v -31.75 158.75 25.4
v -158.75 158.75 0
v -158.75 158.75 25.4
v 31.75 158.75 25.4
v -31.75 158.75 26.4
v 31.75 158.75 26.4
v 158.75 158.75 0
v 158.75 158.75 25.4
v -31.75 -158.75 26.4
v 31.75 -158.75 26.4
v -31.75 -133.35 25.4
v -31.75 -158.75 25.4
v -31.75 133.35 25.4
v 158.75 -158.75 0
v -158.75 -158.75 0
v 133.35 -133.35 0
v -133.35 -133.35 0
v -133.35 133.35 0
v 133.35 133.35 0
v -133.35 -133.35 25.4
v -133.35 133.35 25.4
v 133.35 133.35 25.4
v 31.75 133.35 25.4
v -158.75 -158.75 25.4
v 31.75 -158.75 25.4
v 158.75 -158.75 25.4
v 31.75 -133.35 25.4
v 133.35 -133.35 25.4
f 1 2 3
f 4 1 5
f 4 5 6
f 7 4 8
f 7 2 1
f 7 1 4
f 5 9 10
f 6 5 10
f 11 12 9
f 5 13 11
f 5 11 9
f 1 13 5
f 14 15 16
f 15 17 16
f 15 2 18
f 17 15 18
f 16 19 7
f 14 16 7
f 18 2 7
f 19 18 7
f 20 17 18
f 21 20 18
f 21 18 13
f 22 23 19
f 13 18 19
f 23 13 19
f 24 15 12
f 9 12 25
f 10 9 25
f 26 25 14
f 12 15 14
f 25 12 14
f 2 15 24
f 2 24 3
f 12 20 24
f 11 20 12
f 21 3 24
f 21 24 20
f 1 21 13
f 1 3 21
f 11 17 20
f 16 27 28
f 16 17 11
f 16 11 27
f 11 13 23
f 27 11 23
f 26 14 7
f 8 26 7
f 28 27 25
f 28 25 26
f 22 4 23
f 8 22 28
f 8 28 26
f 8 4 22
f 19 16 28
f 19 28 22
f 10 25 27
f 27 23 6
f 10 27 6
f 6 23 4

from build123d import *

# Parameters (mm, degrees)
F0_W     = 317.5
F0_H     = 317.5
F0_W_2   = 266.7
F0_H_2   = 266.7
F1_DEPTH = 25.4
F2_W     = 63.5
F2_H     = 317.5
F3_DEPTH = 1


with BuildPart() as f1:
    # F0 (on Top) → F1 (new body)
    with BuildSketch(Plane.XY):
        Rectangle(F0_W, F0_H)
        Rectangle(F0_W_2, F0_H_2, mode=Mode.SUBTRACT)
    extrude(amount=F1_DEPTH)

    # F2 (on face) → F3 (join)
    with BuildSketch(Plane.XY.offset(25.4)):
        Rectangle(F2_W, F2_H)
    extrude(amount=F3_DEPTH)


solid = f1.part
